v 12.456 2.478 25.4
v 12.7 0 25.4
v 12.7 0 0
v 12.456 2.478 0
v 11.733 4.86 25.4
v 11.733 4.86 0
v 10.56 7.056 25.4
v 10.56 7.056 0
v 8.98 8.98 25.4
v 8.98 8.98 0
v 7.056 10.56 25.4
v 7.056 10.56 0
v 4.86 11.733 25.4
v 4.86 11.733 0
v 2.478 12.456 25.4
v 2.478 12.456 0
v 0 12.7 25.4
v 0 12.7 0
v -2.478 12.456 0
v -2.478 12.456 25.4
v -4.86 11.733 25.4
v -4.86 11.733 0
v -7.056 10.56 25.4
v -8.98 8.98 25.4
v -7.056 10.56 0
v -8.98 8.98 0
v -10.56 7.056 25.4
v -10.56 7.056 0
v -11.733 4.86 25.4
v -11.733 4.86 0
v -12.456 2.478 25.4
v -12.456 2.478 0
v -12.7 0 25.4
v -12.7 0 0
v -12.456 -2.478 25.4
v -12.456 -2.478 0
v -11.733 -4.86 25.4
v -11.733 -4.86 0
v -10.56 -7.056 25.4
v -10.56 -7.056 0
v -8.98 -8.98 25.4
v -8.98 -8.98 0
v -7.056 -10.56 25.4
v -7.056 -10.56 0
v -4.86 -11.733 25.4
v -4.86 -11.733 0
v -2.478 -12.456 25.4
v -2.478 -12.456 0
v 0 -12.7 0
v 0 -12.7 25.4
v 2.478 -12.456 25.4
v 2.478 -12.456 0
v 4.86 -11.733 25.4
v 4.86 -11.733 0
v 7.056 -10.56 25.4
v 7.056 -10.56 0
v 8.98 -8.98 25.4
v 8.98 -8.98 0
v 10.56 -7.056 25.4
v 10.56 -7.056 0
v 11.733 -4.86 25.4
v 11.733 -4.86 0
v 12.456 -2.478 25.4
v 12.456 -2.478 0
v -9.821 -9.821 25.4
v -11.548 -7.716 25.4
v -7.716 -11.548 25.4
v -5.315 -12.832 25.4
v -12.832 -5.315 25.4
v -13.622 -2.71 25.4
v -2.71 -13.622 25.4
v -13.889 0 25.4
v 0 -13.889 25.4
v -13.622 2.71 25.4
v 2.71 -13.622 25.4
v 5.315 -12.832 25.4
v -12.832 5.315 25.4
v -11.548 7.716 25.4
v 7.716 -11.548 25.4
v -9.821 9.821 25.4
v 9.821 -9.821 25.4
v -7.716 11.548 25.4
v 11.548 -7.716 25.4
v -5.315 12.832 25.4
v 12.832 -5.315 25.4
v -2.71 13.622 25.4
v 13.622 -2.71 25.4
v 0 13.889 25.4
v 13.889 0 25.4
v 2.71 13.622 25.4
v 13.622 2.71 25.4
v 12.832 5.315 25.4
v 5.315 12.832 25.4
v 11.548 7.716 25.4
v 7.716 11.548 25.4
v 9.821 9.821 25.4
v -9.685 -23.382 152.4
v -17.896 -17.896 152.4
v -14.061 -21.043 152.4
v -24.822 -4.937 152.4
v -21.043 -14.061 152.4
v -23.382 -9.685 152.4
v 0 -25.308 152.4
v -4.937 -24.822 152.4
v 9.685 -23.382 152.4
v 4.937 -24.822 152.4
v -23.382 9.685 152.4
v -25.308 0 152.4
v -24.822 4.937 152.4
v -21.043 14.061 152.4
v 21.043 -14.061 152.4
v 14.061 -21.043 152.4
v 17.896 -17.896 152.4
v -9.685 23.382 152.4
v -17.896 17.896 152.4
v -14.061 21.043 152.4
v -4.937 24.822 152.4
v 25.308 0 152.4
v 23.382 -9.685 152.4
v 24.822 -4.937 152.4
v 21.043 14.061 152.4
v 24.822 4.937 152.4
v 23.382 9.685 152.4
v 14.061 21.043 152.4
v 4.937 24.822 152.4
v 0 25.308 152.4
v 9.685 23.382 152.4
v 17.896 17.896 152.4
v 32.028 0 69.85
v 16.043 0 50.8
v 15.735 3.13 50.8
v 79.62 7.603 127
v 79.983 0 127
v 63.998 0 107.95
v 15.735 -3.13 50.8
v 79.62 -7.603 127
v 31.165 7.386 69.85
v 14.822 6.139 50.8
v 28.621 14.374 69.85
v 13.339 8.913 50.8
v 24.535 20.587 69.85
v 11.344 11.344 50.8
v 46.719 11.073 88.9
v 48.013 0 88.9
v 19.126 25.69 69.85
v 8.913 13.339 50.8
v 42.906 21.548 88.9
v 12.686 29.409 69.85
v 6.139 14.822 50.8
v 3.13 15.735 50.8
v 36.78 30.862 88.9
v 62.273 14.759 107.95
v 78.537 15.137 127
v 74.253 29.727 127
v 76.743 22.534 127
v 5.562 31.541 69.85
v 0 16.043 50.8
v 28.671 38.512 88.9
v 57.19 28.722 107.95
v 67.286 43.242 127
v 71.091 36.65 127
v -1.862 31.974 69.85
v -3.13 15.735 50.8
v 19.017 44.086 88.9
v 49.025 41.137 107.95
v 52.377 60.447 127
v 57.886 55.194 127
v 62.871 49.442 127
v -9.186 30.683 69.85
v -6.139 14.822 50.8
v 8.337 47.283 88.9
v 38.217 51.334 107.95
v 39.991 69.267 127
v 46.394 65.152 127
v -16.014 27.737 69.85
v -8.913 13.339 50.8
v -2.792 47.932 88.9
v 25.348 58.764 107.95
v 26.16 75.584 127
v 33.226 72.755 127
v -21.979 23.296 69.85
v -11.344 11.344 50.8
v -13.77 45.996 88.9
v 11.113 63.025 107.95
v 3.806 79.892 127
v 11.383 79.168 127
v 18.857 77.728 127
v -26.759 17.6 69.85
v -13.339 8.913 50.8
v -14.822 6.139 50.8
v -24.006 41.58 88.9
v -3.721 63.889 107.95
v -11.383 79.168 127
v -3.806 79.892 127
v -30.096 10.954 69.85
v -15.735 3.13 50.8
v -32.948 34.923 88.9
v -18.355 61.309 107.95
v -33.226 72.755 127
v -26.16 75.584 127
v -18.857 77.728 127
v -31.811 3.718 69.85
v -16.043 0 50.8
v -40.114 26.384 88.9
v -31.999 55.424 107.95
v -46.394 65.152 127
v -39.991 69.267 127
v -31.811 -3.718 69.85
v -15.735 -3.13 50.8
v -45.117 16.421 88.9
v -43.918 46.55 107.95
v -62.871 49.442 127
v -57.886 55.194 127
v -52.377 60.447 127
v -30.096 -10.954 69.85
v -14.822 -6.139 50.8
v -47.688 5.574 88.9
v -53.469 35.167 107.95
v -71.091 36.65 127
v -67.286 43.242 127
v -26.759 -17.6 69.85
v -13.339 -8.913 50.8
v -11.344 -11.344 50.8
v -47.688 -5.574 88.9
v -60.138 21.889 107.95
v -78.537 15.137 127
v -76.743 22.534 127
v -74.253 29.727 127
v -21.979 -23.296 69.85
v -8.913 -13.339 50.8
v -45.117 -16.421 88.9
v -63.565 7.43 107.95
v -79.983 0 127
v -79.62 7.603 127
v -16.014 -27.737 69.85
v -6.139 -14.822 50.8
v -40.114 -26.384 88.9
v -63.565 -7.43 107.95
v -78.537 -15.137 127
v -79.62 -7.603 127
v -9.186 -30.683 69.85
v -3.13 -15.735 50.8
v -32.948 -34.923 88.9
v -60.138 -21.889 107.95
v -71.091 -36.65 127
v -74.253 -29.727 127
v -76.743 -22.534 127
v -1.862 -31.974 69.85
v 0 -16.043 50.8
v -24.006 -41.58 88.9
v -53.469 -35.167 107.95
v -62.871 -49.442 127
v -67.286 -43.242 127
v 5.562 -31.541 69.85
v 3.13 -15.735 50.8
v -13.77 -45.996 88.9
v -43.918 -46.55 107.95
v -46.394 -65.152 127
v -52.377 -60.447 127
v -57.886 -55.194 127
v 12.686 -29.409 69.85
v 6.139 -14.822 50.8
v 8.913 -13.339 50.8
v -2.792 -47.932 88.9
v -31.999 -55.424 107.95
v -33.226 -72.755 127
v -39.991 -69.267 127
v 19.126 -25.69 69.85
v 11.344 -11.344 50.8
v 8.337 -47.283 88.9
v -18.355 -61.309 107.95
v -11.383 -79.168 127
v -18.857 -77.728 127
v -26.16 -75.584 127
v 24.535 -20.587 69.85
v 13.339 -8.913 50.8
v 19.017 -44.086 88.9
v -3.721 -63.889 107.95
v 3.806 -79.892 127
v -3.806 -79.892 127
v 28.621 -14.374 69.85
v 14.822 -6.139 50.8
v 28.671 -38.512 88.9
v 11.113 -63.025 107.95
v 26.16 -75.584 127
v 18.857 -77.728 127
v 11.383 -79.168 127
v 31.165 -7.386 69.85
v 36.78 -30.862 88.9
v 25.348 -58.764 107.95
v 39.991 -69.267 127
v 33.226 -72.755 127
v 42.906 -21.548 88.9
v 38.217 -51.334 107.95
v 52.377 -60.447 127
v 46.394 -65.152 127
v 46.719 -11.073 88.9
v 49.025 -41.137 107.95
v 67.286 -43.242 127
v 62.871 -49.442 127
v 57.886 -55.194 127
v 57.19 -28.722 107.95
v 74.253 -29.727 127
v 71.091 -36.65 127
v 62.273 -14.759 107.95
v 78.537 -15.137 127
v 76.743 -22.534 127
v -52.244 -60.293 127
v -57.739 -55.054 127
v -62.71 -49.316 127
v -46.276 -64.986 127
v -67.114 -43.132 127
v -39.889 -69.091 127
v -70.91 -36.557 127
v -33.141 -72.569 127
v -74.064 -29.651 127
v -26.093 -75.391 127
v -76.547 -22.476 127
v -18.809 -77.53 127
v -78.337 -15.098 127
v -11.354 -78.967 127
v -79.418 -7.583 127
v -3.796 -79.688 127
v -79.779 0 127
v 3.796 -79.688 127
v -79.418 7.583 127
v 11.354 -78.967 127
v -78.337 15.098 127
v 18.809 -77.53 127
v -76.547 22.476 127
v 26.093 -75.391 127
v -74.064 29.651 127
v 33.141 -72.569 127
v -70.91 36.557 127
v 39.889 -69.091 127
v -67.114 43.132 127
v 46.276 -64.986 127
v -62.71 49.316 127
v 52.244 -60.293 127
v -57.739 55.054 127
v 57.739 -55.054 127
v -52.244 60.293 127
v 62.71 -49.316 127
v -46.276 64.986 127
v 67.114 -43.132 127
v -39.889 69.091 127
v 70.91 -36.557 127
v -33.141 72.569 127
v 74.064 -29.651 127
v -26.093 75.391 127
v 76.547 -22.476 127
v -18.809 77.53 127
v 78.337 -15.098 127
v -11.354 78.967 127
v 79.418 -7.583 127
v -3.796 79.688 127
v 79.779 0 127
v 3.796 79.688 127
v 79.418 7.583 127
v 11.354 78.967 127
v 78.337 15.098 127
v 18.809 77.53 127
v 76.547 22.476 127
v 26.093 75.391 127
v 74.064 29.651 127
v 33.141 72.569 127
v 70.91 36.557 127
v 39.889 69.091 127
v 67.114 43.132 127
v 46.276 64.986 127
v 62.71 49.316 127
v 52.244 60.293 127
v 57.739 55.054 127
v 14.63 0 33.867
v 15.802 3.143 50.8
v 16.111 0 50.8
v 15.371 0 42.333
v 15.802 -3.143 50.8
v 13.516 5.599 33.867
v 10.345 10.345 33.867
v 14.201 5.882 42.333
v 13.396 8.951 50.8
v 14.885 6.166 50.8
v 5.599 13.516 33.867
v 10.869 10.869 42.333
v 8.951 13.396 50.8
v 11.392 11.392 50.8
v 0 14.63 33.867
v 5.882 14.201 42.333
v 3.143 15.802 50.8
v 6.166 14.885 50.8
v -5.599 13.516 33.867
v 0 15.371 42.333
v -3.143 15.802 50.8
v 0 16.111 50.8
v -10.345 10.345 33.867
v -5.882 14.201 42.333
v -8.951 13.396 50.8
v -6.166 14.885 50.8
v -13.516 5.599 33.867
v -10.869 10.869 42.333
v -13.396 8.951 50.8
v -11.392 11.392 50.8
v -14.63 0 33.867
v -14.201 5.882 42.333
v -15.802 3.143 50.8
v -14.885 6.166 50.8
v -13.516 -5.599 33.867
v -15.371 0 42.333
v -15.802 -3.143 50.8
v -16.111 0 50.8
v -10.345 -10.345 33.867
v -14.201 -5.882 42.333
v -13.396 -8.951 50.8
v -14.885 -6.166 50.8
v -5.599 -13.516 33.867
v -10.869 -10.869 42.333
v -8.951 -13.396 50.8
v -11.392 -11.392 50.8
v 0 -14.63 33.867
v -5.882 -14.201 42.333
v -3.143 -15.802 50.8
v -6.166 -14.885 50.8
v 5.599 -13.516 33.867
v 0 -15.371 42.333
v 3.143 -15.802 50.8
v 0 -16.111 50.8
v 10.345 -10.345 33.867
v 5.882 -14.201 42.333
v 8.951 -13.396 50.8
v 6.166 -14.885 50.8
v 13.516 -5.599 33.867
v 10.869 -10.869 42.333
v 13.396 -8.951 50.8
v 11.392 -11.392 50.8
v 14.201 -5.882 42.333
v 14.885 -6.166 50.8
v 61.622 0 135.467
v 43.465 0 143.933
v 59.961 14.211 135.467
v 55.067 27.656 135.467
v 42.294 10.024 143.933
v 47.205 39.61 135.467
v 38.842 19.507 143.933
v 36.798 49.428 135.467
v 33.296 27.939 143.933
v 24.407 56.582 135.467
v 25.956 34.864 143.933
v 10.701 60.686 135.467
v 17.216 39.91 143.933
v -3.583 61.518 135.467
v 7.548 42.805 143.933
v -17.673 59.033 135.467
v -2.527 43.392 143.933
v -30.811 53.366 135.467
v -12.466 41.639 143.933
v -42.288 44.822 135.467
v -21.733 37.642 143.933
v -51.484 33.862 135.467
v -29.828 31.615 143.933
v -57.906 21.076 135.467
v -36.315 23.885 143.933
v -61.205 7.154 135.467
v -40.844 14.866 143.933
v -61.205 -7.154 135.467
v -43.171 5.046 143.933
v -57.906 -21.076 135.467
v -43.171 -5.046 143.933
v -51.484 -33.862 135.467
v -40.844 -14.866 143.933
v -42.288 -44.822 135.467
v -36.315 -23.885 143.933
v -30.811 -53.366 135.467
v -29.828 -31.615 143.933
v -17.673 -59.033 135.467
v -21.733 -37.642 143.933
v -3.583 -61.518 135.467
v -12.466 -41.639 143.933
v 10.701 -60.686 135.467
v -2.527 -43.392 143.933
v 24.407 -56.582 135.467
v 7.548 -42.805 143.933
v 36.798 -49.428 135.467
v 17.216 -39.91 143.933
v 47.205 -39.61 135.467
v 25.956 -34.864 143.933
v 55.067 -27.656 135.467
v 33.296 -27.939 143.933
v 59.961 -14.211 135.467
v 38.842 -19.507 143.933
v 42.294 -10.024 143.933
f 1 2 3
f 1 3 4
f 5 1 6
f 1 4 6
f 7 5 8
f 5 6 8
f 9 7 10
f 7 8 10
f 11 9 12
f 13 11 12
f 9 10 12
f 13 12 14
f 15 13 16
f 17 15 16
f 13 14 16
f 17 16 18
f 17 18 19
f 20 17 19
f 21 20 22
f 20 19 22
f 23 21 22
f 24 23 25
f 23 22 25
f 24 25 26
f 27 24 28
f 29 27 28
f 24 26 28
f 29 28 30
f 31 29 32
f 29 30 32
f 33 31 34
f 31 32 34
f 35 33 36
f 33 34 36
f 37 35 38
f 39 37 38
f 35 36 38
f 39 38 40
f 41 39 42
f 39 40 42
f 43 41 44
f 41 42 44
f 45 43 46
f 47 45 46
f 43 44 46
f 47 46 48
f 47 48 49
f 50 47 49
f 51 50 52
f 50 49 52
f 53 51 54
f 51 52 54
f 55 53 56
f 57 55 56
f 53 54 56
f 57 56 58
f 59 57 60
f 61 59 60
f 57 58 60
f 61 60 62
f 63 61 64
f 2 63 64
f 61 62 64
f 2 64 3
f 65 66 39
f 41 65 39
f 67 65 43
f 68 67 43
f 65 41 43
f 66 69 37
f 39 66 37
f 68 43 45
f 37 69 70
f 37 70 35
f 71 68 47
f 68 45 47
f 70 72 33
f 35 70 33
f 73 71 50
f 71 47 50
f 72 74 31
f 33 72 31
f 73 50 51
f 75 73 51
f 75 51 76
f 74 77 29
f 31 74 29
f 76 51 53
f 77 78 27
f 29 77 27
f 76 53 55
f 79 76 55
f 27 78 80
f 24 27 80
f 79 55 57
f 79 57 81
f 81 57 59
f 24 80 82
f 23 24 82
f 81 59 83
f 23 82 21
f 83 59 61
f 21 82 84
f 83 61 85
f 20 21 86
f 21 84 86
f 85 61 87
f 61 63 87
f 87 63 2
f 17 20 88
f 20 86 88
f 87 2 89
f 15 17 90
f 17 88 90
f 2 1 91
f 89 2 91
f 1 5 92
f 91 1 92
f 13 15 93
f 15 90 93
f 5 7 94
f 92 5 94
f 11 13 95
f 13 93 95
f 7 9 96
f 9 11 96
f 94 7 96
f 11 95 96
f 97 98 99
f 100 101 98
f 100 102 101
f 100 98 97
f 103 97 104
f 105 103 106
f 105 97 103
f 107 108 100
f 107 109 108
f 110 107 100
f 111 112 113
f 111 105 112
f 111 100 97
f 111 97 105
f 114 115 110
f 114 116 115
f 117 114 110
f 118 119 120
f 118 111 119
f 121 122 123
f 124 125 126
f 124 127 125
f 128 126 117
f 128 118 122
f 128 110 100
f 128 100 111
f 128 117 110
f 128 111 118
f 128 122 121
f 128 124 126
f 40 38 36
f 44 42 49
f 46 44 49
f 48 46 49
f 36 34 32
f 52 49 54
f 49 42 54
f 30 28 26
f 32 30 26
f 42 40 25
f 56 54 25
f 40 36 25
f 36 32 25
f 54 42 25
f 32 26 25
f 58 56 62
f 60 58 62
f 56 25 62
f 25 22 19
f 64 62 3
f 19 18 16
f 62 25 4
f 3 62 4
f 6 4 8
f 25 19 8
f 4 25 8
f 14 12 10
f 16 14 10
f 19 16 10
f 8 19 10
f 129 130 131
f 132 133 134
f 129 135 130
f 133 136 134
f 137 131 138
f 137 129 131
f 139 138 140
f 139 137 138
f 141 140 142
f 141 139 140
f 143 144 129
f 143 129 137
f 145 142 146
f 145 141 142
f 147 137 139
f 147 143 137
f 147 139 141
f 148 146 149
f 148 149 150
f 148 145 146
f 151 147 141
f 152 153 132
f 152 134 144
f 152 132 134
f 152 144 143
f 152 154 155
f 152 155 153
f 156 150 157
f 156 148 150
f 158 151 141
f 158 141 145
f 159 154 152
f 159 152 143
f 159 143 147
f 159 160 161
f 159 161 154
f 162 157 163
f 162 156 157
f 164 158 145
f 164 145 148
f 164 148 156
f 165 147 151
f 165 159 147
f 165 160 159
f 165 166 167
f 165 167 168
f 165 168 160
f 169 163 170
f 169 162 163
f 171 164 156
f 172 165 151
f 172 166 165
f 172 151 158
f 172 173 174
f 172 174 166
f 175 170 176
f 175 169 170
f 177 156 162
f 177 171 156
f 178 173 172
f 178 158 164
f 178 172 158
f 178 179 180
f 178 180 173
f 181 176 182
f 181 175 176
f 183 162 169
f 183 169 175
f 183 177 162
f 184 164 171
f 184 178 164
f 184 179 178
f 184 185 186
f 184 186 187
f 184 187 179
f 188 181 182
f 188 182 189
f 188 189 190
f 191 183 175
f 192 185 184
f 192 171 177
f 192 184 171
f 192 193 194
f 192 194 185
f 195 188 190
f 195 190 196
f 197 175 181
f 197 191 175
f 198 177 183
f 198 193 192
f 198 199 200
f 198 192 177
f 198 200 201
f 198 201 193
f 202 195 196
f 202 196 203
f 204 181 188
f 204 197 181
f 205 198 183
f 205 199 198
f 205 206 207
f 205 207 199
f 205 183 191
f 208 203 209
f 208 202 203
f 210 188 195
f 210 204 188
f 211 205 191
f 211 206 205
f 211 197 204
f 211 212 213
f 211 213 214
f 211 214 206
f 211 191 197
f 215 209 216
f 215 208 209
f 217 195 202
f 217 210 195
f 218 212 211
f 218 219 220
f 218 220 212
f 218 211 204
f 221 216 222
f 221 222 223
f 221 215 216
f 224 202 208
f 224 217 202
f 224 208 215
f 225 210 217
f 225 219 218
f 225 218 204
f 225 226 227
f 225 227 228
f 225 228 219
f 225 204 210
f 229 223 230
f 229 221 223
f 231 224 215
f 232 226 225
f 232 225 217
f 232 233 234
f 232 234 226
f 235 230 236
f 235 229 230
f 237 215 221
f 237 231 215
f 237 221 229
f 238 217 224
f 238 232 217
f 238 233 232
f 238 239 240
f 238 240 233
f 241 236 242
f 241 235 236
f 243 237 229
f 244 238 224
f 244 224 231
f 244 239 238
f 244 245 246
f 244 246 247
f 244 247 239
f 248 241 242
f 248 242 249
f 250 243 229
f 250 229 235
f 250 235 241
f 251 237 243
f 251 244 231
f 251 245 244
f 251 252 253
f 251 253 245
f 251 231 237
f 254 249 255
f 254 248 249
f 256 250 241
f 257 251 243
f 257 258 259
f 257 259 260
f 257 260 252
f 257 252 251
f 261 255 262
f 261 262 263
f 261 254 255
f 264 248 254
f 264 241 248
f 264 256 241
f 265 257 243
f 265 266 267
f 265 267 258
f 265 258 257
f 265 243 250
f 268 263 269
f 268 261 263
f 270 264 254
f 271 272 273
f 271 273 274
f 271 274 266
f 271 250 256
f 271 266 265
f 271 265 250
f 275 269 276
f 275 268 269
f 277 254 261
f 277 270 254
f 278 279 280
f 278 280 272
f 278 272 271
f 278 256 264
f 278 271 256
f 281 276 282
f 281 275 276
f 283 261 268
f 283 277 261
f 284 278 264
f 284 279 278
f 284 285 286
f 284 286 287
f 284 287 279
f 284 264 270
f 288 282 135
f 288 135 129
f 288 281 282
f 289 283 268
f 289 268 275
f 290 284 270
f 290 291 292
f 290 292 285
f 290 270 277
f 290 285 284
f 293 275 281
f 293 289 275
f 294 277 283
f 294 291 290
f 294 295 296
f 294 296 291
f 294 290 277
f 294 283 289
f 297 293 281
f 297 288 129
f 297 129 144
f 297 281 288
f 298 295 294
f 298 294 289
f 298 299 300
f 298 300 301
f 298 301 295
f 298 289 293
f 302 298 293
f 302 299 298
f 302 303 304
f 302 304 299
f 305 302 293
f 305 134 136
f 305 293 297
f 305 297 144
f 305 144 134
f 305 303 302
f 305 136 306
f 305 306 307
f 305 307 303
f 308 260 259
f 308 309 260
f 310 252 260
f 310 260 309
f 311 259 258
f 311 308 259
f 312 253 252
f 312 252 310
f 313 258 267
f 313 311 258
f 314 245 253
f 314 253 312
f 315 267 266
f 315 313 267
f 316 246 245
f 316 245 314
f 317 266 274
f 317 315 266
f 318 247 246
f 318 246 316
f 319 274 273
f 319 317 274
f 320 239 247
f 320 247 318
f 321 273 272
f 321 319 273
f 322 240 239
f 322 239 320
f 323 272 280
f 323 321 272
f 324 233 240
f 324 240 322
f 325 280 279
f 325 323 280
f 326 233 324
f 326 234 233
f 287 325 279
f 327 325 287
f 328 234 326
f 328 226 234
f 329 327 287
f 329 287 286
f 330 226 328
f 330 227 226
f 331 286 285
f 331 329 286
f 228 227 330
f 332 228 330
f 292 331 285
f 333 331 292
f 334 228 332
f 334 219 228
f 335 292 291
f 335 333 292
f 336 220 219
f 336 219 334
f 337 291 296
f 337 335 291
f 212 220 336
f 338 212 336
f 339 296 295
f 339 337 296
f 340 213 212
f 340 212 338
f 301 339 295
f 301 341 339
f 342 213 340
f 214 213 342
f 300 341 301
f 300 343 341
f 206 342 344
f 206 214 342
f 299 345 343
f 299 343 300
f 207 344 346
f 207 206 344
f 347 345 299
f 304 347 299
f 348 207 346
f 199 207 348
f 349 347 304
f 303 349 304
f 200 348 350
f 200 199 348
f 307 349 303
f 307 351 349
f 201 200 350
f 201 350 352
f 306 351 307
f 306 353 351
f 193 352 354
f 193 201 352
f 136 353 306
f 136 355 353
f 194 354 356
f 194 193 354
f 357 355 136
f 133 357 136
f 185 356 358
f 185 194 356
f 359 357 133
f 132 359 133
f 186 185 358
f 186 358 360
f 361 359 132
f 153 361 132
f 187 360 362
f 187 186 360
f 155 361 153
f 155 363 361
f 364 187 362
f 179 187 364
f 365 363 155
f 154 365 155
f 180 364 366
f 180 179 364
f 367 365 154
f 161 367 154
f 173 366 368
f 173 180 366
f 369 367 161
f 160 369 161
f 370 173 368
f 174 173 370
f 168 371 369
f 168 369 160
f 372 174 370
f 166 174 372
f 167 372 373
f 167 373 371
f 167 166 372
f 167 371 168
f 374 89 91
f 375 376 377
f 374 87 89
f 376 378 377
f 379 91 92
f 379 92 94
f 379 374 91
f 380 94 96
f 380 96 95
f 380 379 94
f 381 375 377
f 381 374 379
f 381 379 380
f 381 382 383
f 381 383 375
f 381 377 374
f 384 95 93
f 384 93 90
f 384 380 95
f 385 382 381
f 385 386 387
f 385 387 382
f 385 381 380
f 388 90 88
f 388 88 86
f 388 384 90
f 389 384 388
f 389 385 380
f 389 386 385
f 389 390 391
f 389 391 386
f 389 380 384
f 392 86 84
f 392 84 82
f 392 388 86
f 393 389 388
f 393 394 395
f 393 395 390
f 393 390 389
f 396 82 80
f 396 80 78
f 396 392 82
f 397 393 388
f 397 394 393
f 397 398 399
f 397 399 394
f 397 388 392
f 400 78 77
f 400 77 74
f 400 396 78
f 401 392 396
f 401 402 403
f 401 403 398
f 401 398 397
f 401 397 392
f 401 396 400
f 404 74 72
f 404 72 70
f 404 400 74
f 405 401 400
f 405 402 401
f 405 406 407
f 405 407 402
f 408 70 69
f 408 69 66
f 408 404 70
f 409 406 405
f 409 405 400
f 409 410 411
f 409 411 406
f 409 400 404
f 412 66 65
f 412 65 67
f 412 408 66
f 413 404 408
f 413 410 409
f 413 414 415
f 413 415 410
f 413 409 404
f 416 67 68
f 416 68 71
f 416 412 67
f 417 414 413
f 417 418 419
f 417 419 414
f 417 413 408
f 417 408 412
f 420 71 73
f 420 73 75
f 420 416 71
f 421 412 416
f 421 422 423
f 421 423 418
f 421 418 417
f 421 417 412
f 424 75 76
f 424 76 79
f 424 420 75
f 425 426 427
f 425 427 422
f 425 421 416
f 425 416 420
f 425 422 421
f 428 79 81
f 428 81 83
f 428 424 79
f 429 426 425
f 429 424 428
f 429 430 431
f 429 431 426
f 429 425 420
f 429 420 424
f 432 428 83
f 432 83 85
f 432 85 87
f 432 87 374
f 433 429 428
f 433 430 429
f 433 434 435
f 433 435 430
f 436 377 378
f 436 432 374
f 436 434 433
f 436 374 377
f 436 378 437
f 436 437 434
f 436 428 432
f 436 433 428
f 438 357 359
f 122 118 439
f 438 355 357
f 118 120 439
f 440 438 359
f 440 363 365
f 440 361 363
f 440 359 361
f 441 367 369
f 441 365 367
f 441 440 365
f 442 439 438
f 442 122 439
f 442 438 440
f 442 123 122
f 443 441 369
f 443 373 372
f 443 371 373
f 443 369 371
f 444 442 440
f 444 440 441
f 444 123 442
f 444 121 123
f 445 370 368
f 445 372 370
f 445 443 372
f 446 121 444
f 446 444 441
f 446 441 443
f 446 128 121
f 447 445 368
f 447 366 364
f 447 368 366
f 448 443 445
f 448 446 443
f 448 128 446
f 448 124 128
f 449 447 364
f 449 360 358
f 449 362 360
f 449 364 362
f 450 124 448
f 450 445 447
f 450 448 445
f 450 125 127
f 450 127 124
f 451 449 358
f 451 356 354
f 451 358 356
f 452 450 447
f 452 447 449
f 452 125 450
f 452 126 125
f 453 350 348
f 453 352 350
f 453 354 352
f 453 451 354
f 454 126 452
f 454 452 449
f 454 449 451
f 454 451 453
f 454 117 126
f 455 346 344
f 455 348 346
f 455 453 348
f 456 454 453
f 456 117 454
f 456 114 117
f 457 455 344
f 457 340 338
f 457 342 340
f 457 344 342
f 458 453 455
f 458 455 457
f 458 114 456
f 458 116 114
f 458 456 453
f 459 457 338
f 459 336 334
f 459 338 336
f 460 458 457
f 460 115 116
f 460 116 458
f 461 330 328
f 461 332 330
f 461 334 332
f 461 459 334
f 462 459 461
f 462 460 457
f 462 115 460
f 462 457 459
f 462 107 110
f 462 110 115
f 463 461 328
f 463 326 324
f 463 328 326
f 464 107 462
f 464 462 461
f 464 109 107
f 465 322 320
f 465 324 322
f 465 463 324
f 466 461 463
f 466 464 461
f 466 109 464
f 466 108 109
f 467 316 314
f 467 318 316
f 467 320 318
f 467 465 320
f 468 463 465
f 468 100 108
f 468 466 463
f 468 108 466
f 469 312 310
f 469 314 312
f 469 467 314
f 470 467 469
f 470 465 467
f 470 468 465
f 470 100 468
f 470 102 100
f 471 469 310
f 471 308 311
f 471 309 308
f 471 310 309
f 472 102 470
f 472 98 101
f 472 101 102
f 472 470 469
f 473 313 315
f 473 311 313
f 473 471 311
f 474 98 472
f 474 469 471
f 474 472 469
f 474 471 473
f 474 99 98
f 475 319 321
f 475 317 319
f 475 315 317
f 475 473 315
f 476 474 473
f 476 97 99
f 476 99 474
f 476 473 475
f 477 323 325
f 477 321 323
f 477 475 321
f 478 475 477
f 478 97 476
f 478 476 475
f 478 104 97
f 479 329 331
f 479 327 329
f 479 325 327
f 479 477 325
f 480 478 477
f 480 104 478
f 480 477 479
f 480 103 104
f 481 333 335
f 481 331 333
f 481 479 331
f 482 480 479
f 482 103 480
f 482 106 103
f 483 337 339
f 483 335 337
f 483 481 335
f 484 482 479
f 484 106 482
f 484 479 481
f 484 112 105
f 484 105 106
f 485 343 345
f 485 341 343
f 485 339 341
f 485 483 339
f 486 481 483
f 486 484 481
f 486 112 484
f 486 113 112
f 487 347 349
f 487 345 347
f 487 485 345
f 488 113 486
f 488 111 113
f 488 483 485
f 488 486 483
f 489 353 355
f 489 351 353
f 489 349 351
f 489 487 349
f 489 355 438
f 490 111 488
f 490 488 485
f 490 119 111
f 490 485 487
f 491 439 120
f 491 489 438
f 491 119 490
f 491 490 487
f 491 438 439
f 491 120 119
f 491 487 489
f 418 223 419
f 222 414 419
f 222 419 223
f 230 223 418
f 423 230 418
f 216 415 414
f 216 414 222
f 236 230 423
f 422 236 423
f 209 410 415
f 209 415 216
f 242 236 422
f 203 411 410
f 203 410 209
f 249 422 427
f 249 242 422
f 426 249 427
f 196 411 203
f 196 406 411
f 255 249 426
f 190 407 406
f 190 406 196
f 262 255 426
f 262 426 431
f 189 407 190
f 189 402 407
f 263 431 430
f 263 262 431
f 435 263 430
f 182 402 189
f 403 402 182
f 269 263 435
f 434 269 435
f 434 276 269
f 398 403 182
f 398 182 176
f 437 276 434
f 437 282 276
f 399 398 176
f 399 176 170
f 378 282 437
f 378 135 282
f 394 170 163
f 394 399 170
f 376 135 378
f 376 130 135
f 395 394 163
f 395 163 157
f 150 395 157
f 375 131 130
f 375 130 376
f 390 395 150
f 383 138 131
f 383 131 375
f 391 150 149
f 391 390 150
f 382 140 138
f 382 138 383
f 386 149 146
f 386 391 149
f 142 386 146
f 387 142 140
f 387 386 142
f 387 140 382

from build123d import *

# Parameters (mm, degrees)
F0_R     = 12.7
F1_DEPTH = 25.4
F2_R     = 13.889054696
F3_DEPTH = 25.4
F3_TAPER = -5
F4_R     = 16.0431717149
F5_DEPTH = 76.2
F5_TAPER = -40
F6_R     = 79.7788549735
F7_DEPTH = 25.4
F7_TAPER = 65


with BuildPart() as f1:
    # F0 (on Top) → F1 (new body)
    with BuildSketch(Plane.XY):
        Circle(F0_R)
    extrude(amount=F1_DEPTH)

    # F2 (on face) → F3 (join)
    with BuildSketch(Plane.XY.offset(25.4)):
        Circle(F2_R)
    extrude(amount=F3_DEPTH, taper=F3_TAPER)

    # F4 (on face) → F5 (join)
    with BuildSketch(Plane.XY.offset(50.8)):
        Circle(F4_R)
    extrude(amount=F5_DEPTH, taper=F5_TAPER)

    # F6 (on face) → F7 (join)
    with BuildSketch(Plane.XY.offset(127)):
        Circle(F6_R)
    extrude(amount=F7_DEPTH, taper=F7_TAPER)


solid = f1.part
